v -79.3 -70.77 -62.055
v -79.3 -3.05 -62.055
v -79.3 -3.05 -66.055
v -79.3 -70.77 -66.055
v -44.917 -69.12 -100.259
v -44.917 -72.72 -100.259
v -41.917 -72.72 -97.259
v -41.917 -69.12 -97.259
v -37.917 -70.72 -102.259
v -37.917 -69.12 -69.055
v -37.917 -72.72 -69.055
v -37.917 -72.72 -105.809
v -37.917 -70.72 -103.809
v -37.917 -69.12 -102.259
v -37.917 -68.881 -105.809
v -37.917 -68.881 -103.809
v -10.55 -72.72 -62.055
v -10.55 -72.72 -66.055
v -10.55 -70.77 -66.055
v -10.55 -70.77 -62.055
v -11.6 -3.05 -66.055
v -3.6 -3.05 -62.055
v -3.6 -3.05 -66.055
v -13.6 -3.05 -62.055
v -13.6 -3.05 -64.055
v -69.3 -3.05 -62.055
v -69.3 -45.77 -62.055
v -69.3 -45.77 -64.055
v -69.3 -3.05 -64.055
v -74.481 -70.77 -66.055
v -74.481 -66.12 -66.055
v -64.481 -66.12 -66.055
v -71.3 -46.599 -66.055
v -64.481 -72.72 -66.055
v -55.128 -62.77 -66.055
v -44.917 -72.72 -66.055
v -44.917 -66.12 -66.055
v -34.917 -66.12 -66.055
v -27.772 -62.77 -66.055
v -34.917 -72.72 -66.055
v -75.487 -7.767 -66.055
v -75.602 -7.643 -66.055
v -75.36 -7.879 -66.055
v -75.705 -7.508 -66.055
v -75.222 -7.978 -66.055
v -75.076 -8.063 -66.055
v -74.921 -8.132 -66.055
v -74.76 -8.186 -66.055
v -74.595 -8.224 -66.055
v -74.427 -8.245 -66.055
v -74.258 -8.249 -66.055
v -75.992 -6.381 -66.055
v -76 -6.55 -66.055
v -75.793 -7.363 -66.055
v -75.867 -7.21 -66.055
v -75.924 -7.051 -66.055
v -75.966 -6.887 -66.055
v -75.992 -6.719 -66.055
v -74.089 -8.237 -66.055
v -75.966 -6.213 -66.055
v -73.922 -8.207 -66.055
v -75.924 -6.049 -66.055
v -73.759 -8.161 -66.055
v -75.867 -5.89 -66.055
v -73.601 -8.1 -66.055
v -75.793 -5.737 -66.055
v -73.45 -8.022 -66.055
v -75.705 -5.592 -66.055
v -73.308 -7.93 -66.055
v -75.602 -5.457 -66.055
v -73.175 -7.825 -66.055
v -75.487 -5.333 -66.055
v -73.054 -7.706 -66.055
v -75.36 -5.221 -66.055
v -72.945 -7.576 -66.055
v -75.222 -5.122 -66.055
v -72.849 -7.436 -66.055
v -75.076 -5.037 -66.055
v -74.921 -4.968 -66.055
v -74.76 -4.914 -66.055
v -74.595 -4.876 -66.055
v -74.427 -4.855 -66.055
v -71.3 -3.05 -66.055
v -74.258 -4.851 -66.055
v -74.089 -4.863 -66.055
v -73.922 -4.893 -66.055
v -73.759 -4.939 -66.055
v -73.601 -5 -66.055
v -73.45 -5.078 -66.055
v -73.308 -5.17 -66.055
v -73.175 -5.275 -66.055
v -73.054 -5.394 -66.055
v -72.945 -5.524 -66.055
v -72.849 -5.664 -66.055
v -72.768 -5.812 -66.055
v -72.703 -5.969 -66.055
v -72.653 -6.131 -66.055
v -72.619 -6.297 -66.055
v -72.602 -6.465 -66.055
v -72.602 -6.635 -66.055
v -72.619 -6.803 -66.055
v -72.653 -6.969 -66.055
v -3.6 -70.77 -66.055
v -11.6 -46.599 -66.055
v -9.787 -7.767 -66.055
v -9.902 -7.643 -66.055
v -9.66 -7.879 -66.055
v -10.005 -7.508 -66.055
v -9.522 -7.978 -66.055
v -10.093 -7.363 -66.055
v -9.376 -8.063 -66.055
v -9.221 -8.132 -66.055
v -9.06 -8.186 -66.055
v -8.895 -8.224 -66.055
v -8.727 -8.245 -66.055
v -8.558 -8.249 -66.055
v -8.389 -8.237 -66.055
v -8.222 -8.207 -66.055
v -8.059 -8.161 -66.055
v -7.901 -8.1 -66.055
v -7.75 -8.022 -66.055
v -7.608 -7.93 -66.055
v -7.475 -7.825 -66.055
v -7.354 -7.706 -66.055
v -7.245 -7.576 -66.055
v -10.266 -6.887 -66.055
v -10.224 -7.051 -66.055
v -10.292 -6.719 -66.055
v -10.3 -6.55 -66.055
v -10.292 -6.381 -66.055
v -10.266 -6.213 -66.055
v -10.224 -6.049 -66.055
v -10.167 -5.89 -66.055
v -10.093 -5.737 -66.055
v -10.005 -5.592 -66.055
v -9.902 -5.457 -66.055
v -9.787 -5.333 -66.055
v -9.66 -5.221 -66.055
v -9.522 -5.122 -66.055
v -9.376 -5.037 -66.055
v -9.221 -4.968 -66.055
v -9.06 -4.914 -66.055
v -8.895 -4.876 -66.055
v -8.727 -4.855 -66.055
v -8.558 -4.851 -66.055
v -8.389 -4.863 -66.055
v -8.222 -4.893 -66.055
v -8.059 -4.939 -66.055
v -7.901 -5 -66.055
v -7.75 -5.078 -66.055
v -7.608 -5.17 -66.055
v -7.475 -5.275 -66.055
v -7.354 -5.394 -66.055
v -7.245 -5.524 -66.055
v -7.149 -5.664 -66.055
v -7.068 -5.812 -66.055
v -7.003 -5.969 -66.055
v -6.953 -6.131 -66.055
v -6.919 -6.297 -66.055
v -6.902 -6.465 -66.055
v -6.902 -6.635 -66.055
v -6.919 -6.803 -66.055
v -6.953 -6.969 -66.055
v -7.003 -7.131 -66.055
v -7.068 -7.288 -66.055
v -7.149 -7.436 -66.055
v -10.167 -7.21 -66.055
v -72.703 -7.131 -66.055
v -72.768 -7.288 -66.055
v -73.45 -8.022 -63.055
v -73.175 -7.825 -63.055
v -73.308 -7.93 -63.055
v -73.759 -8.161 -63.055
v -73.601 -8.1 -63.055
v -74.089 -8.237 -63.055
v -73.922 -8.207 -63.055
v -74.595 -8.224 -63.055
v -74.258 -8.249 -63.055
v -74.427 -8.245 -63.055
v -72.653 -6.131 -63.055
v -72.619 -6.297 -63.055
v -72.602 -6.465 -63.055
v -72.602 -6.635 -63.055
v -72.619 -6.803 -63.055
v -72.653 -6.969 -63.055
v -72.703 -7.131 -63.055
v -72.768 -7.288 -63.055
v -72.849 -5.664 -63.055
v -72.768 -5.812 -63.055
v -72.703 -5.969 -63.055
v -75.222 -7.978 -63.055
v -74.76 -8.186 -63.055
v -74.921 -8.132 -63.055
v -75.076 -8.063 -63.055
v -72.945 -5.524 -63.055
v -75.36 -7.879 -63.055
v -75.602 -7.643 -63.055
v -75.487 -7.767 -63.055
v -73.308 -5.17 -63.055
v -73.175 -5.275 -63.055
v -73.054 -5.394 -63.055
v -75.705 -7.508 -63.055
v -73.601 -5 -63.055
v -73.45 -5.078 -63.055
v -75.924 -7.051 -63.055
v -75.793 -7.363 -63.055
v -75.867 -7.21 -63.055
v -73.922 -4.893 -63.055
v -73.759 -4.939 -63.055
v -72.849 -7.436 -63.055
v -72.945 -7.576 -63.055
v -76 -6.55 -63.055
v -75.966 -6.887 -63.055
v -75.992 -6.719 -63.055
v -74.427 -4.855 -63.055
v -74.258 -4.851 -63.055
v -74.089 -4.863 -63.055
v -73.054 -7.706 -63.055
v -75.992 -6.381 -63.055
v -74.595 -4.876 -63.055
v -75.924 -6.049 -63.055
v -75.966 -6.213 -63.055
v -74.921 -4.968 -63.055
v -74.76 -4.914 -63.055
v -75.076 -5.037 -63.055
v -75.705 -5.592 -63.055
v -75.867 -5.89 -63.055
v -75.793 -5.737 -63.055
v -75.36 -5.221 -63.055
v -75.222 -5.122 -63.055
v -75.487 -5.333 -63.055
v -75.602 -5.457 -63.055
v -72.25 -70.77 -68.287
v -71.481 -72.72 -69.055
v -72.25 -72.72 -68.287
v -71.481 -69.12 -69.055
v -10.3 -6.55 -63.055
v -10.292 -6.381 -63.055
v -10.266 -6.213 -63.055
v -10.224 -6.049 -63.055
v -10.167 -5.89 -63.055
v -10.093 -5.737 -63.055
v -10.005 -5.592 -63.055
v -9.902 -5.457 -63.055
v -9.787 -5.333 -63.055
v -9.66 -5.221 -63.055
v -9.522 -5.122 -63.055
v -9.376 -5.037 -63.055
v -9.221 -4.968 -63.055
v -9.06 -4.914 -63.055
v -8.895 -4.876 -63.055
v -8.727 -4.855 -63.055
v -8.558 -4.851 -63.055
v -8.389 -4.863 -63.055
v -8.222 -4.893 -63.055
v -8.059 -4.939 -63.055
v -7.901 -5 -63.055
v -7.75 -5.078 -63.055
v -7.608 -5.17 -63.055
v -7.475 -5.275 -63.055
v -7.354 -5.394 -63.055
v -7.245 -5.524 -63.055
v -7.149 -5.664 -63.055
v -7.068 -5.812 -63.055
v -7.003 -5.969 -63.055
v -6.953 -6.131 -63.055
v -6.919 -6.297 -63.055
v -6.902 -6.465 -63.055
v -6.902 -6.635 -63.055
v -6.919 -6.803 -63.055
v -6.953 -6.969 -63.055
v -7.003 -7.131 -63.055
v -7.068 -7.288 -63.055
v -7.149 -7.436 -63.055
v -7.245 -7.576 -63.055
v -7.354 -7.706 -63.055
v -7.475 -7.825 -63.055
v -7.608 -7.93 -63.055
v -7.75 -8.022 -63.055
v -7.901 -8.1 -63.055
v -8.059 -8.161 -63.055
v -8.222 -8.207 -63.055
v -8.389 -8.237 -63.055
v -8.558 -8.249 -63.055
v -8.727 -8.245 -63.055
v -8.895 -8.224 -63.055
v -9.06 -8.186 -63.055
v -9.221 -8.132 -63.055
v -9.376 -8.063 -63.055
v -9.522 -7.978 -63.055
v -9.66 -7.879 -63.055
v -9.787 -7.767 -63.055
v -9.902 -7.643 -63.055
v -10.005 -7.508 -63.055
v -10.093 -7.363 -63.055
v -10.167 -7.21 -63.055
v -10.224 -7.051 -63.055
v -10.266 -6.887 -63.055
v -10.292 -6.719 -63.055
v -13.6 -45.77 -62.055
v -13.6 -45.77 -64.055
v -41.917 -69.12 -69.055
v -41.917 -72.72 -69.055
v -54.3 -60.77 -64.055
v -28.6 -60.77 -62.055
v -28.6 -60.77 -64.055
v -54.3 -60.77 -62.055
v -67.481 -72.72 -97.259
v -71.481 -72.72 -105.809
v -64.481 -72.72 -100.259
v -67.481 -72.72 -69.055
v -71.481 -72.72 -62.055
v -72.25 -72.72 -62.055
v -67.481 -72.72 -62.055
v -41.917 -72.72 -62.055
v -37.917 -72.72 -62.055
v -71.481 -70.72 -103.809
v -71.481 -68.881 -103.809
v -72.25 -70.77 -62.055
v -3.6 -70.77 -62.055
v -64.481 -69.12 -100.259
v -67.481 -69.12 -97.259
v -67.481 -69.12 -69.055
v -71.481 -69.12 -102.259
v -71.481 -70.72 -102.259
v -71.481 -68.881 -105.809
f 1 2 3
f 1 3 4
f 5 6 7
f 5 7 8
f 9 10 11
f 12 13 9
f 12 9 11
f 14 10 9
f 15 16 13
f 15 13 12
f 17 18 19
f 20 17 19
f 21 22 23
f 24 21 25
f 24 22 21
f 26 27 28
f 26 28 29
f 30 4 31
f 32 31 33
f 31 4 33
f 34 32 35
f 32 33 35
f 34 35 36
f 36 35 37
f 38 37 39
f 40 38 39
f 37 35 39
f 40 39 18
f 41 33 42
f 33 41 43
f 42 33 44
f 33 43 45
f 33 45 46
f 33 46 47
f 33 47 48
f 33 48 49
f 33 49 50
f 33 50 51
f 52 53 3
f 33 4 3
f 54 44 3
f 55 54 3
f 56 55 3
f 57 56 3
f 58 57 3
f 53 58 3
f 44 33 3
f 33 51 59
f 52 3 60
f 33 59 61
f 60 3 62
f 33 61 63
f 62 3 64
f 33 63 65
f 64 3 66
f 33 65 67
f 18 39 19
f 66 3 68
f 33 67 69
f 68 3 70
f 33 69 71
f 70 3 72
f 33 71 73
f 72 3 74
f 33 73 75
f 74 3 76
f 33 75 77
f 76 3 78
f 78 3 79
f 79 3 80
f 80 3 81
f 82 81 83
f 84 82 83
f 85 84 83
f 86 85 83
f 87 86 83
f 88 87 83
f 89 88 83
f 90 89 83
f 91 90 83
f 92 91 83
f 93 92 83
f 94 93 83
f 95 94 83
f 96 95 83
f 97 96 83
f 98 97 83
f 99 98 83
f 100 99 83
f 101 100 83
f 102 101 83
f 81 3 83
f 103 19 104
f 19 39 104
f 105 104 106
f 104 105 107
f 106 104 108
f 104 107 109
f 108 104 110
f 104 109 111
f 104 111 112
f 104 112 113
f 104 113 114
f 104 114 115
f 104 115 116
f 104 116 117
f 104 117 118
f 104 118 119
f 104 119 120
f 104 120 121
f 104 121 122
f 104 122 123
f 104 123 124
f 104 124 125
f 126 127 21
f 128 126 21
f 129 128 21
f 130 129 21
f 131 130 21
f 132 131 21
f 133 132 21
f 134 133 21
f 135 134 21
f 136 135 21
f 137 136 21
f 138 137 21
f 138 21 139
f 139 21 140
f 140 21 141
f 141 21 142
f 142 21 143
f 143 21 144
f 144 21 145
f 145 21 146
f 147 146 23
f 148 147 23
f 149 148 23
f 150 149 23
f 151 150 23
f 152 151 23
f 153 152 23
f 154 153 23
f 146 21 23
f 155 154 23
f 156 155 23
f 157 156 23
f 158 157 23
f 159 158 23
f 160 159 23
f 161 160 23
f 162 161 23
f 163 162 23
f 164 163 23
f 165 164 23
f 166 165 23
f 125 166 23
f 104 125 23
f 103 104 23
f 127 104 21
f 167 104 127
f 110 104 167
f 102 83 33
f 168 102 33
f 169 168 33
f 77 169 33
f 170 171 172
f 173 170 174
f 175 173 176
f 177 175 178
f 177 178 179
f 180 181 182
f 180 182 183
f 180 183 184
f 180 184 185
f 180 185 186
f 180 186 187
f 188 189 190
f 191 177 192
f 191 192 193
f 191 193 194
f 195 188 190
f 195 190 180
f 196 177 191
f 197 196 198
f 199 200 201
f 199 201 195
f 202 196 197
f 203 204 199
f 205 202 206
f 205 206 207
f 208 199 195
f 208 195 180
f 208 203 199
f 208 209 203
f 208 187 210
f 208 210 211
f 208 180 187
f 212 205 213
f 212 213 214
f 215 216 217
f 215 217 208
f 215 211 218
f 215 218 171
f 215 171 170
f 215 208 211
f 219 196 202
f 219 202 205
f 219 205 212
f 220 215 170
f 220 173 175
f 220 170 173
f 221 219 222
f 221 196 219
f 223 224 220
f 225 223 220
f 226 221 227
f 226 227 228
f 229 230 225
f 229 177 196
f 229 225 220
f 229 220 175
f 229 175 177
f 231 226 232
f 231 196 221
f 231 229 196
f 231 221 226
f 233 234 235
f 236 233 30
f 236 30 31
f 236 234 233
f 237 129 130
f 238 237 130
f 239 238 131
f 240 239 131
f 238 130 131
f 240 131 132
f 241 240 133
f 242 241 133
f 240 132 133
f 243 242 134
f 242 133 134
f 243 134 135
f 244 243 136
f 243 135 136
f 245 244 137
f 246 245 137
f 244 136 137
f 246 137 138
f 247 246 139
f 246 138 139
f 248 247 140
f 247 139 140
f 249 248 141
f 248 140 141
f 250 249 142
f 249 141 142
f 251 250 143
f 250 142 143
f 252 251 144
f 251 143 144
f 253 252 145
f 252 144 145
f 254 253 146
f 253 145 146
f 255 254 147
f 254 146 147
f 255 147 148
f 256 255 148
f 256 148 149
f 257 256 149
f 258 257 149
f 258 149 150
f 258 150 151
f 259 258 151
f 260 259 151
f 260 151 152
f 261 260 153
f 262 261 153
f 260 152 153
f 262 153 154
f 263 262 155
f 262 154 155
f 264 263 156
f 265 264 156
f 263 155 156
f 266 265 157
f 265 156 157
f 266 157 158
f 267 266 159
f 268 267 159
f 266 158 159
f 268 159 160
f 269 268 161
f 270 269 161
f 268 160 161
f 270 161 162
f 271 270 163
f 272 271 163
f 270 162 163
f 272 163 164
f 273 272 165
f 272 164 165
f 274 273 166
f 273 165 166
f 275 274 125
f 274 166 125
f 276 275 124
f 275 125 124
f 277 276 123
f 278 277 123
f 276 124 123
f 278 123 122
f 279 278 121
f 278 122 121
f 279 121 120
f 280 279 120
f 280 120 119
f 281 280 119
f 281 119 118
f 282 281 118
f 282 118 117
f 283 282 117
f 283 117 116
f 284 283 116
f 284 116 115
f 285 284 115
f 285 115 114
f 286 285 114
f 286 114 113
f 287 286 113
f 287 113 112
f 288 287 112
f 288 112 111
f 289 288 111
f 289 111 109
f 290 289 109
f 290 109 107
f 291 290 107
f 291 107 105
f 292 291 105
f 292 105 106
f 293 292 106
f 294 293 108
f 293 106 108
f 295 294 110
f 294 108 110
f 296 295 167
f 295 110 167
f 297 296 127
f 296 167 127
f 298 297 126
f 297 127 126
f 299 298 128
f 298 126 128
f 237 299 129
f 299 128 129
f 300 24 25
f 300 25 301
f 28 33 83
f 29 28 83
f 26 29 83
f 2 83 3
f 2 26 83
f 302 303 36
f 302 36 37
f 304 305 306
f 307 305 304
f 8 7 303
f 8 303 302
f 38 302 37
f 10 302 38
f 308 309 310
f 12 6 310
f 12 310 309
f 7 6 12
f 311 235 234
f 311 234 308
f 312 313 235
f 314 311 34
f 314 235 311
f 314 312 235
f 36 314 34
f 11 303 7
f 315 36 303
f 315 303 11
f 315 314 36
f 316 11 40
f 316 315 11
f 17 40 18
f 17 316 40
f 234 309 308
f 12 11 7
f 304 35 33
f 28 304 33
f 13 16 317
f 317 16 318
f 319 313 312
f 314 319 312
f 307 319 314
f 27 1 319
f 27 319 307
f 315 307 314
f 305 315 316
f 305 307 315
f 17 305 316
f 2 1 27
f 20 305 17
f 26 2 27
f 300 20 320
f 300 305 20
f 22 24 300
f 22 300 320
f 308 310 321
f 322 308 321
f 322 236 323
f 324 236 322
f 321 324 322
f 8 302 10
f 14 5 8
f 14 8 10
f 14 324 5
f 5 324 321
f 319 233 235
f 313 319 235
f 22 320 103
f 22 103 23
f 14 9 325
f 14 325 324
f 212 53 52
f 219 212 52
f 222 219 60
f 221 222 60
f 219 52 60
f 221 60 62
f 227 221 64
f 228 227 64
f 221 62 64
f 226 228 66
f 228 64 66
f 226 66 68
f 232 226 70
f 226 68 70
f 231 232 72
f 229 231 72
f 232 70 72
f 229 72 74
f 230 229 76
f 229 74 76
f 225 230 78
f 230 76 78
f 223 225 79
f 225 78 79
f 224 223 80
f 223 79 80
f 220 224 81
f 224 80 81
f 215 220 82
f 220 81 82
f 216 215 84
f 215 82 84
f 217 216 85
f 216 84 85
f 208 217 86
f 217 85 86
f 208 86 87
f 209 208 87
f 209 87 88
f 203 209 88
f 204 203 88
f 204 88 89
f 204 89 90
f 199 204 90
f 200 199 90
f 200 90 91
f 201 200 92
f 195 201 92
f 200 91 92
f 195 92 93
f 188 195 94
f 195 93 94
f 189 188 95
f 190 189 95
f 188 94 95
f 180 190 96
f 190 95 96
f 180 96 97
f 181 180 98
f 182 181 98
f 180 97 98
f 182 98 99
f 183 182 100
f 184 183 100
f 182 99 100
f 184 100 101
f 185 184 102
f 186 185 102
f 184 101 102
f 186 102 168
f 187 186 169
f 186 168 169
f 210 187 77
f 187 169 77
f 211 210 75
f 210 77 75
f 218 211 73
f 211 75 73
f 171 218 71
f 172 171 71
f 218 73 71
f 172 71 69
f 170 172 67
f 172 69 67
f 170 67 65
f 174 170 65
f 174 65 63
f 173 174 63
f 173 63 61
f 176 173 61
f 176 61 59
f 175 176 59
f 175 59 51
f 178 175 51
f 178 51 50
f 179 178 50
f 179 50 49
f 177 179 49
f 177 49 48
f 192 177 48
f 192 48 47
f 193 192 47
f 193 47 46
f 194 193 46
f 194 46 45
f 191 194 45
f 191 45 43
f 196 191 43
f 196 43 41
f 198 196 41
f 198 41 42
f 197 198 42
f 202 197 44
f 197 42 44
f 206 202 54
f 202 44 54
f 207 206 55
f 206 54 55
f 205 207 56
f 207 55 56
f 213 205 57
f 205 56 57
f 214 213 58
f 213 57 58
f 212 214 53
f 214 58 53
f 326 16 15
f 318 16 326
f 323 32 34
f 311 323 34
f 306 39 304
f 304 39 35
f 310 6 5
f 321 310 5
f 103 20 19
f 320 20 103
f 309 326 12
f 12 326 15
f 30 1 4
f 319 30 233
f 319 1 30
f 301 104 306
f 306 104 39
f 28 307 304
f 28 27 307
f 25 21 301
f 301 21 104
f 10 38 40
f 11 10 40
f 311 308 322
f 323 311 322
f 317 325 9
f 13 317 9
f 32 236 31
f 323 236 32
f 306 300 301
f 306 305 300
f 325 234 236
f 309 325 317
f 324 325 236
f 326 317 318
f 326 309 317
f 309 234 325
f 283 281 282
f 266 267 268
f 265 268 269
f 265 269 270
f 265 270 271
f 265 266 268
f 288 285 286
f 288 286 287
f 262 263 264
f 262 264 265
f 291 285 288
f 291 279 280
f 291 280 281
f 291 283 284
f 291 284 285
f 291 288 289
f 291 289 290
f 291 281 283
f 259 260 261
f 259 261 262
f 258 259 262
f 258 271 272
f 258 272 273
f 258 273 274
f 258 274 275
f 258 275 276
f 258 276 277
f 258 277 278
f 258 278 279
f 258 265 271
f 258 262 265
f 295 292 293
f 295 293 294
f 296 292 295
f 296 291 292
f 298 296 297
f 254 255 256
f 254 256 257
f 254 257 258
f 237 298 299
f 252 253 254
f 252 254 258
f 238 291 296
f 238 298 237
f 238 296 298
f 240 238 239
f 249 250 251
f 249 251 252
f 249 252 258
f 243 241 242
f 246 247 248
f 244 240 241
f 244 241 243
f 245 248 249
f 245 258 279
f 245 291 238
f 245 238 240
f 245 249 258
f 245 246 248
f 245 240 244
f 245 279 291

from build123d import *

# Parameters (mm, degrees)
SKETCH6_W           = 33.56421262
SKETCH6_H           = 1.838759269
BOSS_EXTRUDE3_DEPTH = 2
SKETCH7_W           = 33.56421262
SKETCH7_H           = 5.55
BOSS_EXTRUDE4_DEPTH = 2
SKETCH8_W           = 2
SKETCH8_H           = 1.6
BOSS_EXTRUDE5_DEPTH = 33.56421262
SKETCH9_W           = 4
SKETCH9_H           = 3.6
BOSS_EXTRUDE6_DEPTH = 38.203681183
BOSS_EXTRUDE7_DEPTH = 4
CHAMFER2_SIZE       = 3
CHAMFER5_SIZE       = 15
SKETCH11_R          = 1.7
CUT_EXTRUDE1_DEPTH  = 3
CHAMFER7_SIZE       = 2


with BuildPart() as part:
    # Sketch6 → Boss-Extrude3 (new body)
    with BuildSketch(Plane(origin=(0, 0, -103.809020593), x_dir=(-1, 0, 0), z_dir=(0, 0, -1))):
        with Locations((54.699348296, -69.800699844)):
            Rectangle(SKETCH6_W, SKETCH6_H)
    extrude(amount=BOSS_EXTRUDE3_DEPTH)

    # Sketch7 → Boss-Extrude4 (add)
    with BuildSketch(Plane.XZ.offset(70.720079478)):
        with Locations((-54.699348296, -103.034020593)):
            Rectangle(SKETCH7_W, SKETCH7_H)
    extrude(amount=BOSS_EXTRUDE4_DEPTH)

    # Sketch8 → Boss-Extrude5 (add)
    with BuildSketch(Plane(origin=(-37.917241986, 0, 0), x_dir=(0, 0, -1), z_dir=(1, 0, 0))):
        with Locations((101.259020593, -69.920079478)):
            Rectangle(SKETCH8_W, SKETCH8_H)
    extrude(amount=-BOSS_EXTRUDE5_DEPTH)

    # Sketch9 → Boss-Extrude6 (add)
    with BuildSketch(Plane.XY.offset(-100.259020593)):
        with Locations((-69.481454606, -70.920079478)):
            Rectangle(SKETCH9_W, SKETCH9_H)
        with Locations((-39.917241986, -70.920079478)):
            Rectangle(SKETCH9_W, SKETCH9_H)
    extrude(amount=BOSS_EXTRUDE6_DEPTH)

    # Sketch10 → Boss-Extrude7 (add)
    with BuildSketch(Plane.XY.offset(-62.055339411)):
        Polygon((-79.3, -70.770079478), (-72.25, -70.770079478), (-72.25, -72.720079478), (-71.481454606, -72.720079478), (-71.481454606, -69.120079478), (-67.481454606, -69.120079478), (-67.481454606, -72.720079478), (-41.917241986, -72.720079478), (-41.917241986, -69.120079478), (-37.917241986, -69.120079478), (-37.917241986, -72.720079478), (-10.55, -72.720079478), (-10.55, -70.770079478), (-3.6, -70.770079478), (-3.6, -3.05), (-13.6, -3.05), (-13.600000688, -60.770079478), (-69.3, -60.770079478), (-69.3, -3.05), (-79.3, -3.05), align=None)
    extrude(amount=-BOSS_EXTRUDE7_DEPTH)

    # Chamfer2
    chamfer2_edges = [part.edges().sort_by_distance(p)[0] for p in [
        (-41.917241986, -70.920079478, -100.259020593),
        (-67.481454606, -70.920079478, -100.259020593),
        (-41.917241986, -70.920079478, -66.055339411),
        (-39.917241986, -69.120079478, -66.055339411),
        (-37.917241986, -70.920079478, -66.055339411),
        (-67.481454606, -70.920079478, -66.055339411),
        (-69.481454606, -69.120079478, -66.055339411),
        (-71.481454606, -70.920079478, -66.055339411),
    ]]
    chamfer(chamfer2_edges, length=CHAMFER2_SIZE)

    # Chamfer5
    chamfer5_edges = [part.edges().sort_by_distance(p)[0] for p in [
        (-69.3, -60.770079478, -64.055339411),
        (-13.600000688, -60.770079478, -64.055339411),
    ]]
    chamfer(chamfer5_edges, length=CHAMFER5_SIZE)

    # Sketch11 → Cut-Extrude1 (cut)
    with BuildSketch(Plane(origin=(0, 0, -66.055339411), x_dir=(-1, 0, 0), z_dir=(0, 0, -1))):
        with Locations((8.6, -6.55)):
            Circle(SKETCH11_R)
        with Locations((74.3, -6.55)):
            Circle(SKETCH11_R)
    extrude(amount=-CUT_EXTRUDE1_DEPTH, mode=Mode.SUBTRACT)

    # Chamfer7
    chamfer7_edges = [part.edges().sort_by_distance(p)[0] for p in [
        (-41.450000344, -60.770079478, -66.055339411),
        (-21.100000599, -53.270079478, -66.055339411),
        (-61.8, -53.270079478, -66.055339411),
        (-69.3, -24.410039739, -66.055339411),
        (-13.600000255, -24.410039739, -66.055339411),
    ]]
    chamfer(chamfer7_edges, length=CHAMFER7_SIZE)


solid = part.part
